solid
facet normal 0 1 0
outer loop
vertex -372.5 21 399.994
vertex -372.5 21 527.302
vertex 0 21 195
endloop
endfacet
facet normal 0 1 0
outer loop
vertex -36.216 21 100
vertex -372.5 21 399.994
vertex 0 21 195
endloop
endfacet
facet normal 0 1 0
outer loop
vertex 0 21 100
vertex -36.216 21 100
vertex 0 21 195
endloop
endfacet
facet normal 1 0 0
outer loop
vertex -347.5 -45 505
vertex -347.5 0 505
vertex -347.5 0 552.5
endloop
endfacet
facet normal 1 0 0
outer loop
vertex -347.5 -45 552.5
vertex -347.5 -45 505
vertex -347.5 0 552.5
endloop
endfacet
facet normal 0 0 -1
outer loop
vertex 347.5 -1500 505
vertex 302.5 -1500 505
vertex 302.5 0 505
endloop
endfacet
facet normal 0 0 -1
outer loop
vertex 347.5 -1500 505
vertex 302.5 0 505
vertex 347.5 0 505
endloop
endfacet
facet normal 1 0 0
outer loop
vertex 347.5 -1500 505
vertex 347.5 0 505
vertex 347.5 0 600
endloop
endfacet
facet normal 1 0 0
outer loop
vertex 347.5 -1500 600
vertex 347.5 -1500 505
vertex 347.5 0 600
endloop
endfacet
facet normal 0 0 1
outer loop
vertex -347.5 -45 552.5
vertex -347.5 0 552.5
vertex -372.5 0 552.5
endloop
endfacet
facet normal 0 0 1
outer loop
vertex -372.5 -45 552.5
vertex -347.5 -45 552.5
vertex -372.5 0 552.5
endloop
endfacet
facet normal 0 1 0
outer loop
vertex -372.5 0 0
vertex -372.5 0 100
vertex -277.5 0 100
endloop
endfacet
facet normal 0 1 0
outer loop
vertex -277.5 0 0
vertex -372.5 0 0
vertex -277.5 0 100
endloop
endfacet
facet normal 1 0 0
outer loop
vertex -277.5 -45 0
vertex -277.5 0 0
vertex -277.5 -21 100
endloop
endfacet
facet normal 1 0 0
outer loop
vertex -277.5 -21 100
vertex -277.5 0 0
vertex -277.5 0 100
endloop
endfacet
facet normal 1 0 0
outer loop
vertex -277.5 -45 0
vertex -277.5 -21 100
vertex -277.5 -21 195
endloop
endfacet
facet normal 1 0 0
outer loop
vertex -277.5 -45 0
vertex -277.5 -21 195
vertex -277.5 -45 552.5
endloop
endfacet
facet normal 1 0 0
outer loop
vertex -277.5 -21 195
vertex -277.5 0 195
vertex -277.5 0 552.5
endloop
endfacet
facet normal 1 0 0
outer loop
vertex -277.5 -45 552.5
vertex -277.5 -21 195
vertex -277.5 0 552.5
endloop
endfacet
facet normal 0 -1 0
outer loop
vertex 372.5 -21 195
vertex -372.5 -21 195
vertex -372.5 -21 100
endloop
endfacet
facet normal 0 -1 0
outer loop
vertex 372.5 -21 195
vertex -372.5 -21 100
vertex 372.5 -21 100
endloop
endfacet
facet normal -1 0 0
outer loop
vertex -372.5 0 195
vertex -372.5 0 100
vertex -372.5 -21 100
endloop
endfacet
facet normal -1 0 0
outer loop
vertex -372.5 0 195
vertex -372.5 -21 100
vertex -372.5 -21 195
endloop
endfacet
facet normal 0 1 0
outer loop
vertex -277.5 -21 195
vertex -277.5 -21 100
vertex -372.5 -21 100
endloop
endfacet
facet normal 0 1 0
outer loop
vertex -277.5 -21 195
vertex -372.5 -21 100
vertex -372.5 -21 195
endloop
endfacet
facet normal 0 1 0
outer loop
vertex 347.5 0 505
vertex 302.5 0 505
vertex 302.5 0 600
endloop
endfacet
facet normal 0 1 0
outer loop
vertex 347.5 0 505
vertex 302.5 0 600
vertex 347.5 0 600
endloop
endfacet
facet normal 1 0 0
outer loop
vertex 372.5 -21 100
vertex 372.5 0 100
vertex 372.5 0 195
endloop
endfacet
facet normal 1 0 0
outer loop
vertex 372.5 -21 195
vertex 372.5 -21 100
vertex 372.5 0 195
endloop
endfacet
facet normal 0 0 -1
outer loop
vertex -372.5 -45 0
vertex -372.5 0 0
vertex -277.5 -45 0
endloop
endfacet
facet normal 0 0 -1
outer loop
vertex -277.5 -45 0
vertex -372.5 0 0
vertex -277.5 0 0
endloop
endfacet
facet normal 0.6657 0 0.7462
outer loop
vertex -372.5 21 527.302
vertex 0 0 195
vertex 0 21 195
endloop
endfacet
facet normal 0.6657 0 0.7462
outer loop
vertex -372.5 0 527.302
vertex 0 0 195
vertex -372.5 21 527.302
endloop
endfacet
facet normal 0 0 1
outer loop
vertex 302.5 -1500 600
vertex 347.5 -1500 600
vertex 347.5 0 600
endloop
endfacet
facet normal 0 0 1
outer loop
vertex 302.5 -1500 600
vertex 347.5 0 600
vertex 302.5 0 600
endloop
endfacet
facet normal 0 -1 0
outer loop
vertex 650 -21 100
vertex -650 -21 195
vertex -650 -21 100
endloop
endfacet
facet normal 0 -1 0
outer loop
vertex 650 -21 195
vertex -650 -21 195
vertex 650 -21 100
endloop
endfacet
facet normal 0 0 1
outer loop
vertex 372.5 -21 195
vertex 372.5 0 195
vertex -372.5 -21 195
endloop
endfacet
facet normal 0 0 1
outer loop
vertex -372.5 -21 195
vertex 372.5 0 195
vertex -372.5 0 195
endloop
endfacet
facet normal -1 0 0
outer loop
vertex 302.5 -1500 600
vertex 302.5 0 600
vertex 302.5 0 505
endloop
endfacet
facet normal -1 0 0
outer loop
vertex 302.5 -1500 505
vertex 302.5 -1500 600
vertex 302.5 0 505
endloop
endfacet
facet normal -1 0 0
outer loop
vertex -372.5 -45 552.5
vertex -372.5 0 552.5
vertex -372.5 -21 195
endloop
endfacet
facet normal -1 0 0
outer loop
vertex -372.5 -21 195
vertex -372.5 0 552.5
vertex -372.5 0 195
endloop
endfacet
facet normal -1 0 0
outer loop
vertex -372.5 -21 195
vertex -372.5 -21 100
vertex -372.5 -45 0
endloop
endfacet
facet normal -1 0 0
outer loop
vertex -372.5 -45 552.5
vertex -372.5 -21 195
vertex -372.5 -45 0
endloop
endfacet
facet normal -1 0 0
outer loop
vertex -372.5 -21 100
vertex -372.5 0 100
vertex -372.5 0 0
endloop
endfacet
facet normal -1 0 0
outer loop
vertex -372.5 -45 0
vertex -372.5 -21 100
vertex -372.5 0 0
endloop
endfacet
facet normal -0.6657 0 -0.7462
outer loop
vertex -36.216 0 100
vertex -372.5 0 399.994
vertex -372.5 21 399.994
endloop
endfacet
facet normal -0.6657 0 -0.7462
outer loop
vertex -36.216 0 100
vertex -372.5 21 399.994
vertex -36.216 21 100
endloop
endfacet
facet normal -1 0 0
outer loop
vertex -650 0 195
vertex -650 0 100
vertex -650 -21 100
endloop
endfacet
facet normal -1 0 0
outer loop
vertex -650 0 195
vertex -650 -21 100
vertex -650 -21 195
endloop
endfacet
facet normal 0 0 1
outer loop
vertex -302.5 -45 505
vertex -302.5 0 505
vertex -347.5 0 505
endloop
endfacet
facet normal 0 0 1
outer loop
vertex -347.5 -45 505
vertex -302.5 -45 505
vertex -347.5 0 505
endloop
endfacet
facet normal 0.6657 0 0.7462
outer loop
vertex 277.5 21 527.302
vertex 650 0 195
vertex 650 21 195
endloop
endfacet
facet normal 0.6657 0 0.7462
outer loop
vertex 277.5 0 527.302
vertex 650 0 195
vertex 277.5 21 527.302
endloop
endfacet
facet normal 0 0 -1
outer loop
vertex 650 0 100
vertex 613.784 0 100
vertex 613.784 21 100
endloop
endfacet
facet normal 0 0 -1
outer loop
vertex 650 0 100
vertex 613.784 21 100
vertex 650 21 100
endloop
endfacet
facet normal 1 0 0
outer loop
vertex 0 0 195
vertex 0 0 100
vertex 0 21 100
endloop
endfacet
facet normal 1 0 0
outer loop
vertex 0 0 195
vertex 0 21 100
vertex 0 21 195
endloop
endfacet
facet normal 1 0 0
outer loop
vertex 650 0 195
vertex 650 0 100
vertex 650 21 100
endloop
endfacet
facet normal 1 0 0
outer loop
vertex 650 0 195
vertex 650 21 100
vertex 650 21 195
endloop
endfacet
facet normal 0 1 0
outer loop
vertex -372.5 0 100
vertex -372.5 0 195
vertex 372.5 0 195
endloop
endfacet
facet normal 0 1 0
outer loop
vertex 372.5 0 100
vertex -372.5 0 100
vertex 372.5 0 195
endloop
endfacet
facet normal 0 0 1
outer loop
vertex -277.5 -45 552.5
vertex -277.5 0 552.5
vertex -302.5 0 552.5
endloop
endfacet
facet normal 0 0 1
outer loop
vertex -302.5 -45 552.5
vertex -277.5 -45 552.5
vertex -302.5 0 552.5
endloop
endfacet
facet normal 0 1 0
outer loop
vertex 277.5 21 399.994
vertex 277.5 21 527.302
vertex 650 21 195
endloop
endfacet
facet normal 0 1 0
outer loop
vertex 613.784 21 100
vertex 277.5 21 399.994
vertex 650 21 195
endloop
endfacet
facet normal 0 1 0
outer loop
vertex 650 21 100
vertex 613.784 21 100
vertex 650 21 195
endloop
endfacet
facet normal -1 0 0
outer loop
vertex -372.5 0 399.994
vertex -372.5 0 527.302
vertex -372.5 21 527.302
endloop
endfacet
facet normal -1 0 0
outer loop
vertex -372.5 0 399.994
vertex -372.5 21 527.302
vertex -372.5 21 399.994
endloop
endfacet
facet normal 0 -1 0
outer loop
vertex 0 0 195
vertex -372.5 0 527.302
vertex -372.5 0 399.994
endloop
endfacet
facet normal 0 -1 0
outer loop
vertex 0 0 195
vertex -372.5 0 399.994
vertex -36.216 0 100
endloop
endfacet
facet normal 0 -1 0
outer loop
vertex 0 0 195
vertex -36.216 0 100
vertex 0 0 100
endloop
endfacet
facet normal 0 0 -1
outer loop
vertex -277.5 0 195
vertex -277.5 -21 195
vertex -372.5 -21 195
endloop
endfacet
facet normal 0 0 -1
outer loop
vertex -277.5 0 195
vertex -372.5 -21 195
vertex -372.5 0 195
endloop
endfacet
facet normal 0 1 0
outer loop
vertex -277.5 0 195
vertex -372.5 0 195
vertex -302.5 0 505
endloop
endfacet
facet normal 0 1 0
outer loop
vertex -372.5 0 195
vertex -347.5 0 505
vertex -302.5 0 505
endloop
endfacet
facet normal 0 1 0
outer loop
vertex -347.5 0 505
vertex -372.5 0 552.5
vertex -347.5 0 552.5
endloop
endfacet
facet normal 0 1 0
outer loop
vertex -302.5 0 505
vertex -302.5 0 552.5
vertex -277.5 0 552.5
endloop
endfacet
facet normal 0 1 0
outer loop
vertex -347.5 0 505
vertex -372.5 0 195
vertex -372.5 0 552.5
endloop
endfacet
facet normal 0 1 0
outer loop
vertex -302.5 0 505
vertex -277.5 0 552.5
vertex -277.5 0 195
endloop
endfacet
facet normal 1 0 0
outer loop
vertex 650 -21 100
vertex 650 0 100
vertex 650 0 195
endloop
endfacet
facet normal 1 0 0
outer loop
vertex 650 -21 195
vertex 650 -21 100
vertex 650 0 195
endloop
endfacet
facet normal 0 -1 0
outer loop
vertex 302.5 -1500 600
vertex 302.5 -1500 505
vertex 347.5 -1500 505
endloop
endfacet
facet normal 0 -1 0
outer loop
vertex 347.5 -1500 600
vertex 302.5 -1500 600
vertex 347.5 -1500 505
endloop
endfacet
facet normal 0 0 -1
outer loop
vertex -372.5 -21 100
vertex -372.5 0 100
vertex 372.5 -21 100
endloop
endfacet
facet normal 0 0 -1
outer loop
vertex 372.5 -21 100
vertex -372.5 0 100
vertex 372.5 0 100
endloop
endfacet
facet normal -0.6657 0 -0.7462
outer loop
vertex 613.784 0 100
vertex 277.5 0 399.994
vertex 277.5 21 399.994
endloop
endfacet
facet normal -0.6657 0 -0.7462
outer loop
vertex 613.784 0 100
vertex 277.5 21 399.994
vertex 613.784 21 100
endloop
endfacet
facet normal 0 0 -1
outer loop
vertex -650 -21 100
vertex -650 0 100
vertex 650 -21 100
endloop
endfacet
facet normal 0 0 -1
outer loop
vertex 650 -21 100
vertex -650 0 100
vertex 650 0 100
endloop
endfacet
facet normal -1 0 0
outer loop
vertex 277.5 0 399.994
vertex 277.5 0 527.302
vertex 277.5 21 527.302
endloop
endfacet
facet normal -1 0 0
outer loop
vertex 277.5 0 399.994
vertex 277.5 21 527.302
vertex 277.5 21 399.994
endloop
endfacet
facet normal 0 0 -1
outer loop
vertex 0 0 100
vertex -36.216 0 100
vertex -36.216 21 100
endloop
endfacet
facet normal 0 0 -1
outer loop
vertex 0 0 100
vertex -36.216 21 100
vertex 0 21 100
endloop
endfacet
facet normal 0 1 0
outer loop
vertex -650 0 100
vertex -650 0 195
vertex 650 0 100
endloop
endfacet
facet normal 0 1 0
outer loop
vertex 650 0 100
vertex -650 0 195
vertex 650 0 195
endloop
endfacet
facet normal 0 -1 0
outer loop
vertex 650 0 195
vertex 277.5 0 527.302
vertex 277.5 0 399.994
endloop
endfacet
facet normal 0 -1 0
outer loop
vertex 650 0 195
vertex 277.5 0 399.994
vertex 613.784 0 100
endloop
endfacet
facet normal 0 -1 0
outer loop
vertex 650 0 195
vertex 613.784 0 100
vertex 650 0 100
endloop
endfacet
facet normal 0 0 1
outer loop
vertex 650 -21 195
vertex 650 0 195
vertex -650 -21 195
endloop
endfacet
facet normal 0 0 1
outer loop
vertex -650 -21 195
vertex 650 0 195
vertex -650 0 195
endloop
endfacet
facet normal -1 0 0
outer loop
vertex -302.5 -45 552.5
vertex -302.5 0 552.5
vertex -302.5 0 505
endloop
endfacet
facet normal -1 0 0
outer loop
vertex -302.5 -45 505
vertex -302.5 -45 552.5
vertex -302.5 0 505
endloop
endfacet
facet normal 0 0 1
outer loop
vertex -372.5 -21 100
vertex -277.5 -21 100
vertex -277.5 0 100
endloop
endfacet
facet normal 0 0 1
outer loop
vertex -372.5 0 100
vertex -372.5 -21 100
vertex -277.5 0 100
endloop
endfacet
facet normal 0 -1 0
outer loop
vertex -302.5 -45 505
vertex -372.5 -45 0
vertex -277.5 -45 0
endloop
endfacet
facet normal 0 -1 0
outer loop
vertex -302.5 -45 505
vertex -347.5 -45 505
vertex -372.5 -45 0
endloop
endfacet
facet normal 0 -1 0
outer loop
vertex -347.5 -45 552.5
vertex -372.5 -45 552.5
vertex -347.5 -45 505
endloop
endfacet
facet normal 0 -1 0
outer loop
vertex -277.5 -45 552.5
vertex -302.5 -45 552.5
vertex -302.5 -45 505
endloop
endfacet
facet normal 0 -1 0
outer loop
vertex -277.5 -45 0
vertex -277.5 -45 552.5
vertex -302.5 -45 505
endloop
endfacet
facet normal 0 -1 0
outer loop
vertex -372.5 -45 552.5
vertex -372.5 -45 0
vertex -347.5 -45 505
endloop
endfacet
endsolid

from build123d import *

# Parameters (mm, degrees)
F0_W     = 95
F0_H     = 95
F0_H_2   = 100
F1_DEPTH = 45
F2_W     = 21
F2_H     = 95
F3_DEPTH = 95.001
F0_W_2   = 277.5
F4_DEPTH = 21
F5_DEPTH = 21
F6_DEPTH = 1500
F7_DEPTH = 21
F8_DEPTH = 21


with BuildPart() as f1:
    # F0 (on Front) → F1 (new body)
    with BuildSketch(Plane.XZ):
        with Locations((-325, 147.5)):
            Rectangle(F0_W, F0_H)
        Polygon((-302.5, 552.5), (-302.5, 505), (-347.5, 505), (-277.5, 442.5539568345), (-277.5, 552.5), align=None)
        with Locations((-325, 50)):
            Rectangle(F0_W, F0_H_2)
        Polygon((-277.5, 315.2462286829), (-372.5, 399.9944301218), (-372.5, 195), (-277.5, 195), align=None)
        Polygon((-277.5, 442.5539568345), (-347.5, 505), (-372.5, 527.3021582734), (-372.5, 399.9944301218), (-277.5, 315.2462286829), align=None)
        Polygon((-372.5, 527.3021582734), (-347.5, 505), (-347.5, 552.5), (-372.5, 552.5), align=None)
    extrude(amount=F1_DEPTH)

    # F2 (on face) → F3 (cut, through all)
    with BuildSketch(Plane.YZ.offset(-277.5)):
        with Locations((-10.5, 147.5)):
            Rectangle(F2_W, F2_H)
    extrude(amount=-F3_DEPTH, mode=Mode.SUBTRACT)


with BuildPart() as f4:
    # F0 (on Front) → F4 (new body)
    with BuildSketch(Plane.XZ):
        with Locations((-511.25, 147.5)):
            Rectangle(F0_W_2, F0_H)
        Polygon((-142.707856557, 195), (-277.5, 195), (-277.5, 100), (-36.2159210732, 100), align=None)
        Polygon((650, 195), (507.292143443, 195), (613.7840789268, 100), (650, 100), align=None)
        Polygon((507.292143443, 195), (372.5, 195), (372.5, 100), (613.7840789268, 100), align=None)
        with Locations((-325, 147.5)):
            Rectangle(F0_W, F0_H)
        with Locations((325, 147.5)):
            Rectangle(F0_W, F0_H)
        with Locations((138.75, 147.5)):
            Rectangle(F0_W_2, F0_H)
        Polygon((0, 100), (0, 195), (-142.707856557, 195), (-36.2159210732, 100), align=None)
    extrude(amount=F4_DEPTH)


with BuildPart() as f5:
    # F0 (on Front) → F5 (new body)
    with BuildSketch(Plane.XZ):
        Polygon((372.5, 315.2462286829), (507.292143443, 195), (650, 195), (372.5, 442.5539568345), align=None)
        Polygon((277.5, 527.3021582734), (277.5, 399.9944301218), (372.5, 315.2462286829), (372.5, 442.5539568345), (302.5, 505), align=None)
        Polygon((650, 195), (507.292143443, 195), (613.7840789268, 100), (650, 100), align=None)
    extrude(amount=-F5_DEPTH)


with BuildPart() as f6:
    # F0 (on Front) → F6 (new body)
    with BuildSketch(Plane.XZ):
        Polygon((302.5, 552.5), (302.5, 505), (347.5, 505), (347.5, 552.5), (347.5, 600), (302.5, 600), align=None)
    extrude(amount=F6_DEPTH)


with BuildPart() as f7:
    # F0 (on Front) → F7 (new body)
    with BuildSketch(Plane.XZ):
        Polygon((-142.707856557, 195), (-277.5, 195), (-277.5, 100), (-36.2159210732, 100), align=None)
        with Locations((325, 147.5)):
            Rectangle(F0_W, F0_H)
        with Locations((-325, 147.5)):
            Rectangle(F0_W, F0_H)
        Polygon((0, 100), (0, 195), (-142.707856557, 195), (-36.2159210732, 100), align=None)
        with Locations((138.75, 147.5)):
            Rectangle(F0_W_2, F0_H)
    extrude(amount=F7_DEPTH)


with BuildPart() as f8:
    # F0 (on Front) → F8 (new body)
    with BuildSketch(Plane.XZ):
        Polygon((0, 195), (-277.5, 442.5539568345), (-277.5, 315.2462286829), (-142.707856557, 195), align=None)
        Polygon((-277.5, 442.5539568345), (-347.5, 505), (-372.5, 527.3021582734), (-372.5, 399.9944301218), (-277.5, 315.2462286829), align=None)
        Polygon((0, 100), (0, 195), (-142.707856557, 195), (-36.2159210732, 100), align=None)
    extrude(amount=-F8_DEPTH)


solid = Compound([f1.part, f4.part, f5.part, f6.part, f7.part, f8.part])
